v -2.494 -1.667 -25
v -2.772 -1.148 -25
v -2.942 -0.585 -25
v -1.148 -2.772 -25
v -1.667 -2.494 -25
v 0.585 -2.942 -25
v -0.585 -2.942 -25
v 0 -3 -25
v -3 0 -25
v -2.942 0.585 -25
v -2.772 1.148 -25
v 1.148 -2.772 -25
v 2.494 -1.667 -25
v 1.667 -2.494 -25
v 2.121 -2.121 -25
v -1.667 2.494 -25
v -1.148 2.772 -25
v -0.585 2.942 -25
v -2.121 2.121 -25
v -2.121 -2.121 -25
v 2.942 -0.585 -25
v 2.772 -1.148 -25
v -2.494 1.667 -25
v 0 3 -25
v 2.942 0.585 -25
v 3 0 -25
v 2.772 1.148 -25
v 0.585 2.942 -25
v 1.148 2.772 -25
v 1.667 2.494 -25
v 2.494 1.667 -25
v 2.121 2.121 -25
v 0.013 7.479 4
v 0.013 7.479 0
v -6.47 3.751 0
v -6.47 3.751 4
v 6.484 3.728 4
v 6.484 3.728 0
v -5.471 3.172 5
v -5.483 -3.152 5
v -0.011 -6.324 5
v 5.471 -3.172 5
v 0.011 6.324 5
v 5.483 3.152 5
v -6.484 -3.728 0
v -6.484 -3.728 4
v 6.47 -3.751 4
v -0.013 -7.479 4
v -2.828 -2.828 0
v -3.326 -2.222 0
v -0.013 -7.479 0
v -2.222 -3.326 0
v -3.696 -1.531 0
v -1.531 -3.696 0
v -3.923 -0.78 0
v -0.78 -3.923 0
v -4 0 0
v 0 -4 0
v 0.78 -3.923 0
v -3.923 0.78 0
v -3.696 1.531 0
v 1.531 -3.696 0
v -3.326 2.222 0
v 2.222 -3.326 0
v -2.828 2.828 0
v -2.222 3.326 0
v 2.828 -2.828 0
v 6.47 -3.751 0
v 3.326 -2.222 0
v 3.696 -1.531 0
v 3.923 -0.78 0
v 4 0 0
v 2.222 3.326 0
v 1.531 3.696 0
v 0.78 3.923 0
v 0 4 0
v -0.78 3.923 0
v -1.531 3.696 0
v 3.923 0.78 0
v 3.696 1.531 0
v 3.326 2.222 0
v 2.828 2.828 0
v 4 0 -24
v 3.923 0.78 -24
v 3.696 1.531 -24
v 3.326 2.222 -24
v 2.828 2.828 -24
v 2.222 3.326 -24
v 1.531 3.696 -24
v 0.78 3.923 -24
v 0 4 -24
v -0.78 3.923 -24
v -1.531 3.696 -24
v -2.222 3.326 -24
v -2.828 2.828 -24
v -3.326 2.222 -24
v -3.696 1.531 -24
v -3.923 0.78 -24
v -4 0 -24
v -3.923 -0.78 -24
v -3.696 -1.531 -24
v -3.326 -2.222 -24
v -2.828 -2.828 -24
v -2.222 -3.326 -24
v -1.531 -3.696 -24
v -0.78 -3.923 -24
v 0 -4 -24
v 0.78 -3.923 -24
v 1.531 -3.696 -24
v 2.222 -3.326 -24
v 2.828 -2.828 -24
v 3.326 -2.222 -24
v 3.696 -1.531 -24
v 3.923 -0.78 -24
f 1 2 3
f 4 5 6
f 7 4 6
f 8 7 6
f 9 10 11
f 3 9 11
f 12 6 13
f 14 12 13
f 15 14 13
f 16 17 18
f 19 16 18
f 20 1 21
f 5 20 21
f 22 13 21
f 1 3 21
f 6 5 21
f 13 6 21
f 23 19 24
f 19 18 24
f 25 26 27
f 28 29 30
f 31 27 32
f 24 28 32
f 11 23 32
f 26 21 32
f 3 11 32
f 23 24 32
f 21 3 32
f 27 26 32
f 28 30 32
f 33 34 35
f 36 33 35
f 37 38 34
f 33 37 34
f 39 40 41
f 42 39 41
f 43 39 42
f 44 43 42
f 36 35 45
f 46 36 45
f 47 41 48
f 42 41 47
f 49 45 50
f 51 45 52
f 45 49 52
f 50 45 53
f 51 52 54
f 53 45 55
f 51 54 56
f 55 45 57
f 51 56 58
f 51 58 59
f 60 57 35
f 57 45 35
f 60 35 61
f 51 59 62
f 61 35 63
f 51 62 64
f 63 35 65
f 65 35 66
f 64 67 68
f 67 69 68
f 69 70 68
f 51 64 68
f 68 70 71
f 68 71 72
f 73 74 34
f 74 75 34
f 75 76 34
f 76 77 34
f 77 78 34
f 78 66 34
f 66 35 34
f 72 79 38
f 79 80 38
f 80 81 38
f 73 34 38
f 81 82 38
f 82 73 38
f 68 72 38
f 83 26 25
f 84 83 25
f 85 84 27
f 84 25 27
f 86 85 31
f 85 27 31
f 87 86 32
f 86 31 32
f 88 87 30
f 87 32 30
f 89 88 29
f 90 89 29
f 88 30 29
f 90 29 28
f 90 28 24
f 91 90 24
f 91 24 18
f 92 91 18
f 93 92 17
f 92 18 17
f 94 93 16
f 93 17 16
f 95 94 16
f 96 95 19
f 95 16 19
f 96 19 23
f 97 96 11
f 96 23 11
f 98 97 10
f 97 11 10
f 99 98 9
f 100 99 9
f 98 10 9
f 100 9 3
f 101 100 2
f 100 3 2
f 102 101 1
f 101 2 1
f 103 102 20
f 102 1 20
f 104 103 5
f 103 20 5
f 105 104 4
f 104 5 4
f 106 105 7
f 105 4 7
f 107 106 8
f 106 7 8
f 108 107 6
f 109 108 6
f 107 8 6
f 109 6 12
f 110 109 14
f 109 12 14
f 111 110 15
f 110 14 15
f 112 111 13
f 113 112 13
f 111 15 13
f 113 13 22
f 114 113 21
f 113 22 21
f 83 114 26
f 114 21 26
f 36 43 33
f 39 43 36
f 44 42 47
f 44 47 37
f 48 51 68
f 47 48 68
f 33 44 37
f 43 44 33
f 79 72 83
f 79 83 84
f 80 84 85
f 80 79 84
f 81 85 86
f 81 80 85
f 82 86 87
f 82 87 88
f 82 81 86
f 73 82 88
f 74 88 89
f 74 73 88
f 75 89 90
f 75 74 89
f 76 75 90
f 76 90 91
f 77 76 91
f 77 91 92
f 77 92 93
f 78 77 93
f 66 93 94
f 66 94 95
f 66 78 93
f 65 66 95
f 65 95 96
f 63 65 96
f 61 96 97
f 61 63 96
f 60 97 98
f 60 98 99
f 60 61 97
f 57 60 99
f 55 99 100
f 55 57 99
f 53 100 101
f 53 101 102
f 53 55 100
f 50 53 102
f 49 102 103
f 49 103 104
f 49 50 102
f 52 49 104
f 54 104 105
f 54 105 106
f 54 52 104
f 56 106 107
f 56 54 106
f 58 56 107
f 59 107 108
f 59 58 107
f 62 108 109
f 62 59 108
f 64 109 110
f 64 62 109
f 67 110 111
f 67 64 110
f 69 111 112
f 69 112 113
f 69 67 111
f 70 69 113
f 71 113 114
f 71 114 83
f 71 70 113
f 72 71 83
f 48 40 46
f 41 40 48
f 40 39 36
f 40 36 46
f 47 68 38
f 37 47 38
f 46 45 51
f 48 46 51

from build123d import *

# Parameters (mm, degrees)
F1_DEPTH = 5
F2_R     = 4
F3_DEPTH = 25
F4_SIZE  = 1
F5_SIZE  = 1


with BuildPart() as f1:
    # F0 (on Top) → F1 (new body)
    with BuildSketch(Plane.XY):
        Polygon((-0.013194, -7.479013), (6.470418, -3.750933), (6.483613, 3.72808), (0.013194, 7.479013), (-6.470418, 3.750933), (-6.483613, -3.72808), align=None)
    extrude(amount=F1_DEPTH)

    # F2 (on Top) → F3 (join)
    with BuildSketch(Plane.XY):
        Circle(F2_R)
    extrude(amount=-F3_DEPTH)

    # F4
    f4_edges = [f1.edges().sort_by_distance(p)[0] for p in [
        (-4, 0, -25),
    ]]
    chamfer(f4_edges, length=F4_SIZE)

    # F5
    f5_edges = [f1.edges().sort_by_distance(p)[0] for p in [
        (6.477015, -0.011427, 5),
        (3.228612, -5.614973, 5),
        (3.248403, 5.603547, 5),
        (-6.477015, 0.011427, 5),
        (-3.248403, -5.603547, 5),
        (-3.228612, 5.614973, 5),
    ]]
    chamfer(f5_edges, length=F5_SIZE)


solid = f1.part
